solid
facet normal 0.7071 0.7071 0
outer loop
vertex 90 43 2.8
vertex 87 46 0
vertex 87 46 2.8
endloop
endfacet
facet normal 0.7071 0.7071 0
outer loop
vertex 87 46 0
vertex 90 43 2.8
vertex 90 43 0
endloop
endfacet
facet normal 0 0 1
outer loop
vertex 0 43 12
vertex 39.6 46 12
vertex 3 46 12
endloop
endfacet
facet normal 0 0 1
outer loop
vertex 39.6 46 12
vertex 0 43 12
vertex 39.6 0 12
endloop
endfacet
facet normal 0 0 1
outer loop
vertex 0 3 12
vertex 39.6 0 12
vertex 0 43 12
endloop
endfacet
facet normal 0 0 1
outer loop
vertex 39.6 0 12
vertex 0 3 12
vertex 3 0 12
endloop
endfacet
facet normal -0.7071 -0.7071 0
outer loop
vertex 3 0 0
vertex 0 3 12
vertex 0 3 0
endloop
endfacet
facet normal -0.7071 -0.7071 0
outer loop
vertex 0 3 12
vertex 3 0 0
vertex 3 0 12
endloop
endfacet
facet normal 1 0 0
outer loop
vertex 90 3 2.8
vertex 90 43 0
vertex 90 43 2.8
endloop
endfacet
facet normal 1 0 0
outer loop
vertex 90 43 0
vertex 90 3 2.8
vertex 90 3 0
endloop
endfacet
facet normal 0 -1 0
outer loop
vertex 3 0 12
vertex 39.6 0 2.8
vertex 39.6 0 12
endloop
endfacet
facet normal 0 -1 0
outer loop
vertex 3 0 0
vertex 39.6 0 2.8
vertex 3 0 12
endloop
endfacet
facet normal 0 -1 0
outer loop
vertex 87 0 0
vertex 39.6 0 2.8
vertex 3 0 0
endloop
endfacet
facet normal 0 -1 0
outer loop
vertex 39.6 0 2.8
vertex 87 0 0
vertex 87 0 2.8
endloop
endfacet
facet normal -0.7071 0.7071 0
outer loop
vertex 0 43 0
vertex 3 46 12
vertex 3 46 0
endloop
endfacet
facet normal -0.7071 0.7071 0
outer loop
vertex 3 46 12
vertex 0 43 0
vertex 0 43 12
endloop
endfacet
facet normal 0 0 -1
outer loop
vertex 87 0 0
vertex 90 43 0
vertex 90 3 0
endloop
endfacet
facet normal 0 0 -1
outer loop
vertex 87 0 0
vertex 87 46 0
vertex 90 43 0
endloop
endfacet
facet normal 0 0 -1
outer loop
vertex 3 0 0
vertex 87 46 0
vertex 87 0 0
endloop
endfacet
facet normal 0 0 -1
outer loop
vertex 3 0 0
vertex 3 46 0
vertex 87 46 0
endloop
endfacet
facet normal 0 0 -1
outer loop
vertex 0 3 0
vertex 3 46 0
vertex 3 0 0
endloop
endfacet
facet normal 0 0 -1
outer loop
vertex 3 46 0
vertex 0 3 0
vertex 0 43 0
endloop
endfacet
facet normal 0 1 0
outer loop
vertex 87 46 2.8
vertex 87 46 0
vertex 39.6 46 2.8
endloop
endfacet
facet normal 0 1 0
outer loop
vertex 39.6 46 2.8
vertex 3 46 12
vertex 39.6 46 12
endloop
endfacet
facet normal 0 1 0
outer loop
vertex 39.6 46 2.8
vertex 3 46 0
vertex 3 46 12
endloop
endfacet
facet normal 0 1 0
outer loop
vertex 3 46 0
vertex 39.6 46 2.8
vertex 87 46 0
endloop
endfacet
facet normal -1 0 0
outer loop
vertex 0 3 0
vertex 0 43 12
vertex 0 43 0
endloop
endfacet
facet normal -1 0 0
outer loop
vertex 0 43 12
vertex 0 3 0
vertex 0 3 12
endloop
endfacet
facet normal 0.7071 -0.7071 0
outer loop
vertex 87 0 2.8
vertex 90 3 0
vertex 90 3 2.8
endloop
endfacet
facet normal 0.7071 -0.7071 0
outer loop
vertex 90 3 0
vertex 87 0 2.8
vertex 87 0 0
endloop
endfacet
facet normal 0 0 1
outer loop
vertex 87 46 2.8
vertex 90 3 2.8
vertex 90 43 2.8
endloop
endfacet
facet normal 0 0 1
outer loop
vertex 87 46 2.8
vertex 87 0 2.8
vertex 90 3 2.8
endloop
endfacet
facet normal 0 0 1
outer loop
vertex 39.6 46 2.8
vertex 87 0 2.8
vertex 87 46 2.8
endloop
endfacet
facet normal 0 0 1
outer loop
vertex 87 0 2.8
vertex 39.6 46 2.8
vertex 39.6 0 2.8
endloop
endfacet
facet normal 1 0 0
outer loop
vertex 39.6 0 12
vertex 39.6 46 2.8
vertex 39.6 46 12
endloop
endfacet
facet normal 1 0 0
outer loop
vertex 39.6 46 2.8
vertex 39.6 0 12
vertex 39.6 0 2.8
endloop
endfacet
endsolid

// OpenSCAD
$fn = 32;

// ----------------------------------------------------------------------
// Stepped bar: endstep, 90 x 46 x 12/2.8 mm
// ----------------------------------------------------------------------

// --- parameters (mm) ---
bar_l = 90;               // bar length, X
bar_w = 46;               // bar width, Y
plate_t = 12;             // thickness of the thick zone, Z
thin_t = 2.8;             // thickness of the thin zone
corner_c = 3;             // corner chamfer of the bar
step_cut = 9.2;           // material removed from the thin zone
step_x = 39.6;            // step position from the left end
depth_1 = 9.2;            // depth of cut 1 from the top face
fit_tol = 0.02;           // declared fit tolerance (prompt contract)
free_tol = 0.2;           // declared free tolerance (prompt contract)

profile = [[3, 0], [87, 0], [90, 3], [90, 43], [87, 46], [3, 46], [0, 43], [0, 3]];  // primary outline, 8 points, counter clockwise
void_1 = [[39.6, -1], [91, -1], [91, 47], [39.6, 47]];  // thin zone beyond the step, 4 points

// --- the one profile operation ---
difference() {
  linear_extrude(height = plate_t) polygon(points = profile);
  translate([0, 0, plate_t - depth_1])
    linear_extrude(height = depth_1 + 1) polygon(points = void_1);
}
